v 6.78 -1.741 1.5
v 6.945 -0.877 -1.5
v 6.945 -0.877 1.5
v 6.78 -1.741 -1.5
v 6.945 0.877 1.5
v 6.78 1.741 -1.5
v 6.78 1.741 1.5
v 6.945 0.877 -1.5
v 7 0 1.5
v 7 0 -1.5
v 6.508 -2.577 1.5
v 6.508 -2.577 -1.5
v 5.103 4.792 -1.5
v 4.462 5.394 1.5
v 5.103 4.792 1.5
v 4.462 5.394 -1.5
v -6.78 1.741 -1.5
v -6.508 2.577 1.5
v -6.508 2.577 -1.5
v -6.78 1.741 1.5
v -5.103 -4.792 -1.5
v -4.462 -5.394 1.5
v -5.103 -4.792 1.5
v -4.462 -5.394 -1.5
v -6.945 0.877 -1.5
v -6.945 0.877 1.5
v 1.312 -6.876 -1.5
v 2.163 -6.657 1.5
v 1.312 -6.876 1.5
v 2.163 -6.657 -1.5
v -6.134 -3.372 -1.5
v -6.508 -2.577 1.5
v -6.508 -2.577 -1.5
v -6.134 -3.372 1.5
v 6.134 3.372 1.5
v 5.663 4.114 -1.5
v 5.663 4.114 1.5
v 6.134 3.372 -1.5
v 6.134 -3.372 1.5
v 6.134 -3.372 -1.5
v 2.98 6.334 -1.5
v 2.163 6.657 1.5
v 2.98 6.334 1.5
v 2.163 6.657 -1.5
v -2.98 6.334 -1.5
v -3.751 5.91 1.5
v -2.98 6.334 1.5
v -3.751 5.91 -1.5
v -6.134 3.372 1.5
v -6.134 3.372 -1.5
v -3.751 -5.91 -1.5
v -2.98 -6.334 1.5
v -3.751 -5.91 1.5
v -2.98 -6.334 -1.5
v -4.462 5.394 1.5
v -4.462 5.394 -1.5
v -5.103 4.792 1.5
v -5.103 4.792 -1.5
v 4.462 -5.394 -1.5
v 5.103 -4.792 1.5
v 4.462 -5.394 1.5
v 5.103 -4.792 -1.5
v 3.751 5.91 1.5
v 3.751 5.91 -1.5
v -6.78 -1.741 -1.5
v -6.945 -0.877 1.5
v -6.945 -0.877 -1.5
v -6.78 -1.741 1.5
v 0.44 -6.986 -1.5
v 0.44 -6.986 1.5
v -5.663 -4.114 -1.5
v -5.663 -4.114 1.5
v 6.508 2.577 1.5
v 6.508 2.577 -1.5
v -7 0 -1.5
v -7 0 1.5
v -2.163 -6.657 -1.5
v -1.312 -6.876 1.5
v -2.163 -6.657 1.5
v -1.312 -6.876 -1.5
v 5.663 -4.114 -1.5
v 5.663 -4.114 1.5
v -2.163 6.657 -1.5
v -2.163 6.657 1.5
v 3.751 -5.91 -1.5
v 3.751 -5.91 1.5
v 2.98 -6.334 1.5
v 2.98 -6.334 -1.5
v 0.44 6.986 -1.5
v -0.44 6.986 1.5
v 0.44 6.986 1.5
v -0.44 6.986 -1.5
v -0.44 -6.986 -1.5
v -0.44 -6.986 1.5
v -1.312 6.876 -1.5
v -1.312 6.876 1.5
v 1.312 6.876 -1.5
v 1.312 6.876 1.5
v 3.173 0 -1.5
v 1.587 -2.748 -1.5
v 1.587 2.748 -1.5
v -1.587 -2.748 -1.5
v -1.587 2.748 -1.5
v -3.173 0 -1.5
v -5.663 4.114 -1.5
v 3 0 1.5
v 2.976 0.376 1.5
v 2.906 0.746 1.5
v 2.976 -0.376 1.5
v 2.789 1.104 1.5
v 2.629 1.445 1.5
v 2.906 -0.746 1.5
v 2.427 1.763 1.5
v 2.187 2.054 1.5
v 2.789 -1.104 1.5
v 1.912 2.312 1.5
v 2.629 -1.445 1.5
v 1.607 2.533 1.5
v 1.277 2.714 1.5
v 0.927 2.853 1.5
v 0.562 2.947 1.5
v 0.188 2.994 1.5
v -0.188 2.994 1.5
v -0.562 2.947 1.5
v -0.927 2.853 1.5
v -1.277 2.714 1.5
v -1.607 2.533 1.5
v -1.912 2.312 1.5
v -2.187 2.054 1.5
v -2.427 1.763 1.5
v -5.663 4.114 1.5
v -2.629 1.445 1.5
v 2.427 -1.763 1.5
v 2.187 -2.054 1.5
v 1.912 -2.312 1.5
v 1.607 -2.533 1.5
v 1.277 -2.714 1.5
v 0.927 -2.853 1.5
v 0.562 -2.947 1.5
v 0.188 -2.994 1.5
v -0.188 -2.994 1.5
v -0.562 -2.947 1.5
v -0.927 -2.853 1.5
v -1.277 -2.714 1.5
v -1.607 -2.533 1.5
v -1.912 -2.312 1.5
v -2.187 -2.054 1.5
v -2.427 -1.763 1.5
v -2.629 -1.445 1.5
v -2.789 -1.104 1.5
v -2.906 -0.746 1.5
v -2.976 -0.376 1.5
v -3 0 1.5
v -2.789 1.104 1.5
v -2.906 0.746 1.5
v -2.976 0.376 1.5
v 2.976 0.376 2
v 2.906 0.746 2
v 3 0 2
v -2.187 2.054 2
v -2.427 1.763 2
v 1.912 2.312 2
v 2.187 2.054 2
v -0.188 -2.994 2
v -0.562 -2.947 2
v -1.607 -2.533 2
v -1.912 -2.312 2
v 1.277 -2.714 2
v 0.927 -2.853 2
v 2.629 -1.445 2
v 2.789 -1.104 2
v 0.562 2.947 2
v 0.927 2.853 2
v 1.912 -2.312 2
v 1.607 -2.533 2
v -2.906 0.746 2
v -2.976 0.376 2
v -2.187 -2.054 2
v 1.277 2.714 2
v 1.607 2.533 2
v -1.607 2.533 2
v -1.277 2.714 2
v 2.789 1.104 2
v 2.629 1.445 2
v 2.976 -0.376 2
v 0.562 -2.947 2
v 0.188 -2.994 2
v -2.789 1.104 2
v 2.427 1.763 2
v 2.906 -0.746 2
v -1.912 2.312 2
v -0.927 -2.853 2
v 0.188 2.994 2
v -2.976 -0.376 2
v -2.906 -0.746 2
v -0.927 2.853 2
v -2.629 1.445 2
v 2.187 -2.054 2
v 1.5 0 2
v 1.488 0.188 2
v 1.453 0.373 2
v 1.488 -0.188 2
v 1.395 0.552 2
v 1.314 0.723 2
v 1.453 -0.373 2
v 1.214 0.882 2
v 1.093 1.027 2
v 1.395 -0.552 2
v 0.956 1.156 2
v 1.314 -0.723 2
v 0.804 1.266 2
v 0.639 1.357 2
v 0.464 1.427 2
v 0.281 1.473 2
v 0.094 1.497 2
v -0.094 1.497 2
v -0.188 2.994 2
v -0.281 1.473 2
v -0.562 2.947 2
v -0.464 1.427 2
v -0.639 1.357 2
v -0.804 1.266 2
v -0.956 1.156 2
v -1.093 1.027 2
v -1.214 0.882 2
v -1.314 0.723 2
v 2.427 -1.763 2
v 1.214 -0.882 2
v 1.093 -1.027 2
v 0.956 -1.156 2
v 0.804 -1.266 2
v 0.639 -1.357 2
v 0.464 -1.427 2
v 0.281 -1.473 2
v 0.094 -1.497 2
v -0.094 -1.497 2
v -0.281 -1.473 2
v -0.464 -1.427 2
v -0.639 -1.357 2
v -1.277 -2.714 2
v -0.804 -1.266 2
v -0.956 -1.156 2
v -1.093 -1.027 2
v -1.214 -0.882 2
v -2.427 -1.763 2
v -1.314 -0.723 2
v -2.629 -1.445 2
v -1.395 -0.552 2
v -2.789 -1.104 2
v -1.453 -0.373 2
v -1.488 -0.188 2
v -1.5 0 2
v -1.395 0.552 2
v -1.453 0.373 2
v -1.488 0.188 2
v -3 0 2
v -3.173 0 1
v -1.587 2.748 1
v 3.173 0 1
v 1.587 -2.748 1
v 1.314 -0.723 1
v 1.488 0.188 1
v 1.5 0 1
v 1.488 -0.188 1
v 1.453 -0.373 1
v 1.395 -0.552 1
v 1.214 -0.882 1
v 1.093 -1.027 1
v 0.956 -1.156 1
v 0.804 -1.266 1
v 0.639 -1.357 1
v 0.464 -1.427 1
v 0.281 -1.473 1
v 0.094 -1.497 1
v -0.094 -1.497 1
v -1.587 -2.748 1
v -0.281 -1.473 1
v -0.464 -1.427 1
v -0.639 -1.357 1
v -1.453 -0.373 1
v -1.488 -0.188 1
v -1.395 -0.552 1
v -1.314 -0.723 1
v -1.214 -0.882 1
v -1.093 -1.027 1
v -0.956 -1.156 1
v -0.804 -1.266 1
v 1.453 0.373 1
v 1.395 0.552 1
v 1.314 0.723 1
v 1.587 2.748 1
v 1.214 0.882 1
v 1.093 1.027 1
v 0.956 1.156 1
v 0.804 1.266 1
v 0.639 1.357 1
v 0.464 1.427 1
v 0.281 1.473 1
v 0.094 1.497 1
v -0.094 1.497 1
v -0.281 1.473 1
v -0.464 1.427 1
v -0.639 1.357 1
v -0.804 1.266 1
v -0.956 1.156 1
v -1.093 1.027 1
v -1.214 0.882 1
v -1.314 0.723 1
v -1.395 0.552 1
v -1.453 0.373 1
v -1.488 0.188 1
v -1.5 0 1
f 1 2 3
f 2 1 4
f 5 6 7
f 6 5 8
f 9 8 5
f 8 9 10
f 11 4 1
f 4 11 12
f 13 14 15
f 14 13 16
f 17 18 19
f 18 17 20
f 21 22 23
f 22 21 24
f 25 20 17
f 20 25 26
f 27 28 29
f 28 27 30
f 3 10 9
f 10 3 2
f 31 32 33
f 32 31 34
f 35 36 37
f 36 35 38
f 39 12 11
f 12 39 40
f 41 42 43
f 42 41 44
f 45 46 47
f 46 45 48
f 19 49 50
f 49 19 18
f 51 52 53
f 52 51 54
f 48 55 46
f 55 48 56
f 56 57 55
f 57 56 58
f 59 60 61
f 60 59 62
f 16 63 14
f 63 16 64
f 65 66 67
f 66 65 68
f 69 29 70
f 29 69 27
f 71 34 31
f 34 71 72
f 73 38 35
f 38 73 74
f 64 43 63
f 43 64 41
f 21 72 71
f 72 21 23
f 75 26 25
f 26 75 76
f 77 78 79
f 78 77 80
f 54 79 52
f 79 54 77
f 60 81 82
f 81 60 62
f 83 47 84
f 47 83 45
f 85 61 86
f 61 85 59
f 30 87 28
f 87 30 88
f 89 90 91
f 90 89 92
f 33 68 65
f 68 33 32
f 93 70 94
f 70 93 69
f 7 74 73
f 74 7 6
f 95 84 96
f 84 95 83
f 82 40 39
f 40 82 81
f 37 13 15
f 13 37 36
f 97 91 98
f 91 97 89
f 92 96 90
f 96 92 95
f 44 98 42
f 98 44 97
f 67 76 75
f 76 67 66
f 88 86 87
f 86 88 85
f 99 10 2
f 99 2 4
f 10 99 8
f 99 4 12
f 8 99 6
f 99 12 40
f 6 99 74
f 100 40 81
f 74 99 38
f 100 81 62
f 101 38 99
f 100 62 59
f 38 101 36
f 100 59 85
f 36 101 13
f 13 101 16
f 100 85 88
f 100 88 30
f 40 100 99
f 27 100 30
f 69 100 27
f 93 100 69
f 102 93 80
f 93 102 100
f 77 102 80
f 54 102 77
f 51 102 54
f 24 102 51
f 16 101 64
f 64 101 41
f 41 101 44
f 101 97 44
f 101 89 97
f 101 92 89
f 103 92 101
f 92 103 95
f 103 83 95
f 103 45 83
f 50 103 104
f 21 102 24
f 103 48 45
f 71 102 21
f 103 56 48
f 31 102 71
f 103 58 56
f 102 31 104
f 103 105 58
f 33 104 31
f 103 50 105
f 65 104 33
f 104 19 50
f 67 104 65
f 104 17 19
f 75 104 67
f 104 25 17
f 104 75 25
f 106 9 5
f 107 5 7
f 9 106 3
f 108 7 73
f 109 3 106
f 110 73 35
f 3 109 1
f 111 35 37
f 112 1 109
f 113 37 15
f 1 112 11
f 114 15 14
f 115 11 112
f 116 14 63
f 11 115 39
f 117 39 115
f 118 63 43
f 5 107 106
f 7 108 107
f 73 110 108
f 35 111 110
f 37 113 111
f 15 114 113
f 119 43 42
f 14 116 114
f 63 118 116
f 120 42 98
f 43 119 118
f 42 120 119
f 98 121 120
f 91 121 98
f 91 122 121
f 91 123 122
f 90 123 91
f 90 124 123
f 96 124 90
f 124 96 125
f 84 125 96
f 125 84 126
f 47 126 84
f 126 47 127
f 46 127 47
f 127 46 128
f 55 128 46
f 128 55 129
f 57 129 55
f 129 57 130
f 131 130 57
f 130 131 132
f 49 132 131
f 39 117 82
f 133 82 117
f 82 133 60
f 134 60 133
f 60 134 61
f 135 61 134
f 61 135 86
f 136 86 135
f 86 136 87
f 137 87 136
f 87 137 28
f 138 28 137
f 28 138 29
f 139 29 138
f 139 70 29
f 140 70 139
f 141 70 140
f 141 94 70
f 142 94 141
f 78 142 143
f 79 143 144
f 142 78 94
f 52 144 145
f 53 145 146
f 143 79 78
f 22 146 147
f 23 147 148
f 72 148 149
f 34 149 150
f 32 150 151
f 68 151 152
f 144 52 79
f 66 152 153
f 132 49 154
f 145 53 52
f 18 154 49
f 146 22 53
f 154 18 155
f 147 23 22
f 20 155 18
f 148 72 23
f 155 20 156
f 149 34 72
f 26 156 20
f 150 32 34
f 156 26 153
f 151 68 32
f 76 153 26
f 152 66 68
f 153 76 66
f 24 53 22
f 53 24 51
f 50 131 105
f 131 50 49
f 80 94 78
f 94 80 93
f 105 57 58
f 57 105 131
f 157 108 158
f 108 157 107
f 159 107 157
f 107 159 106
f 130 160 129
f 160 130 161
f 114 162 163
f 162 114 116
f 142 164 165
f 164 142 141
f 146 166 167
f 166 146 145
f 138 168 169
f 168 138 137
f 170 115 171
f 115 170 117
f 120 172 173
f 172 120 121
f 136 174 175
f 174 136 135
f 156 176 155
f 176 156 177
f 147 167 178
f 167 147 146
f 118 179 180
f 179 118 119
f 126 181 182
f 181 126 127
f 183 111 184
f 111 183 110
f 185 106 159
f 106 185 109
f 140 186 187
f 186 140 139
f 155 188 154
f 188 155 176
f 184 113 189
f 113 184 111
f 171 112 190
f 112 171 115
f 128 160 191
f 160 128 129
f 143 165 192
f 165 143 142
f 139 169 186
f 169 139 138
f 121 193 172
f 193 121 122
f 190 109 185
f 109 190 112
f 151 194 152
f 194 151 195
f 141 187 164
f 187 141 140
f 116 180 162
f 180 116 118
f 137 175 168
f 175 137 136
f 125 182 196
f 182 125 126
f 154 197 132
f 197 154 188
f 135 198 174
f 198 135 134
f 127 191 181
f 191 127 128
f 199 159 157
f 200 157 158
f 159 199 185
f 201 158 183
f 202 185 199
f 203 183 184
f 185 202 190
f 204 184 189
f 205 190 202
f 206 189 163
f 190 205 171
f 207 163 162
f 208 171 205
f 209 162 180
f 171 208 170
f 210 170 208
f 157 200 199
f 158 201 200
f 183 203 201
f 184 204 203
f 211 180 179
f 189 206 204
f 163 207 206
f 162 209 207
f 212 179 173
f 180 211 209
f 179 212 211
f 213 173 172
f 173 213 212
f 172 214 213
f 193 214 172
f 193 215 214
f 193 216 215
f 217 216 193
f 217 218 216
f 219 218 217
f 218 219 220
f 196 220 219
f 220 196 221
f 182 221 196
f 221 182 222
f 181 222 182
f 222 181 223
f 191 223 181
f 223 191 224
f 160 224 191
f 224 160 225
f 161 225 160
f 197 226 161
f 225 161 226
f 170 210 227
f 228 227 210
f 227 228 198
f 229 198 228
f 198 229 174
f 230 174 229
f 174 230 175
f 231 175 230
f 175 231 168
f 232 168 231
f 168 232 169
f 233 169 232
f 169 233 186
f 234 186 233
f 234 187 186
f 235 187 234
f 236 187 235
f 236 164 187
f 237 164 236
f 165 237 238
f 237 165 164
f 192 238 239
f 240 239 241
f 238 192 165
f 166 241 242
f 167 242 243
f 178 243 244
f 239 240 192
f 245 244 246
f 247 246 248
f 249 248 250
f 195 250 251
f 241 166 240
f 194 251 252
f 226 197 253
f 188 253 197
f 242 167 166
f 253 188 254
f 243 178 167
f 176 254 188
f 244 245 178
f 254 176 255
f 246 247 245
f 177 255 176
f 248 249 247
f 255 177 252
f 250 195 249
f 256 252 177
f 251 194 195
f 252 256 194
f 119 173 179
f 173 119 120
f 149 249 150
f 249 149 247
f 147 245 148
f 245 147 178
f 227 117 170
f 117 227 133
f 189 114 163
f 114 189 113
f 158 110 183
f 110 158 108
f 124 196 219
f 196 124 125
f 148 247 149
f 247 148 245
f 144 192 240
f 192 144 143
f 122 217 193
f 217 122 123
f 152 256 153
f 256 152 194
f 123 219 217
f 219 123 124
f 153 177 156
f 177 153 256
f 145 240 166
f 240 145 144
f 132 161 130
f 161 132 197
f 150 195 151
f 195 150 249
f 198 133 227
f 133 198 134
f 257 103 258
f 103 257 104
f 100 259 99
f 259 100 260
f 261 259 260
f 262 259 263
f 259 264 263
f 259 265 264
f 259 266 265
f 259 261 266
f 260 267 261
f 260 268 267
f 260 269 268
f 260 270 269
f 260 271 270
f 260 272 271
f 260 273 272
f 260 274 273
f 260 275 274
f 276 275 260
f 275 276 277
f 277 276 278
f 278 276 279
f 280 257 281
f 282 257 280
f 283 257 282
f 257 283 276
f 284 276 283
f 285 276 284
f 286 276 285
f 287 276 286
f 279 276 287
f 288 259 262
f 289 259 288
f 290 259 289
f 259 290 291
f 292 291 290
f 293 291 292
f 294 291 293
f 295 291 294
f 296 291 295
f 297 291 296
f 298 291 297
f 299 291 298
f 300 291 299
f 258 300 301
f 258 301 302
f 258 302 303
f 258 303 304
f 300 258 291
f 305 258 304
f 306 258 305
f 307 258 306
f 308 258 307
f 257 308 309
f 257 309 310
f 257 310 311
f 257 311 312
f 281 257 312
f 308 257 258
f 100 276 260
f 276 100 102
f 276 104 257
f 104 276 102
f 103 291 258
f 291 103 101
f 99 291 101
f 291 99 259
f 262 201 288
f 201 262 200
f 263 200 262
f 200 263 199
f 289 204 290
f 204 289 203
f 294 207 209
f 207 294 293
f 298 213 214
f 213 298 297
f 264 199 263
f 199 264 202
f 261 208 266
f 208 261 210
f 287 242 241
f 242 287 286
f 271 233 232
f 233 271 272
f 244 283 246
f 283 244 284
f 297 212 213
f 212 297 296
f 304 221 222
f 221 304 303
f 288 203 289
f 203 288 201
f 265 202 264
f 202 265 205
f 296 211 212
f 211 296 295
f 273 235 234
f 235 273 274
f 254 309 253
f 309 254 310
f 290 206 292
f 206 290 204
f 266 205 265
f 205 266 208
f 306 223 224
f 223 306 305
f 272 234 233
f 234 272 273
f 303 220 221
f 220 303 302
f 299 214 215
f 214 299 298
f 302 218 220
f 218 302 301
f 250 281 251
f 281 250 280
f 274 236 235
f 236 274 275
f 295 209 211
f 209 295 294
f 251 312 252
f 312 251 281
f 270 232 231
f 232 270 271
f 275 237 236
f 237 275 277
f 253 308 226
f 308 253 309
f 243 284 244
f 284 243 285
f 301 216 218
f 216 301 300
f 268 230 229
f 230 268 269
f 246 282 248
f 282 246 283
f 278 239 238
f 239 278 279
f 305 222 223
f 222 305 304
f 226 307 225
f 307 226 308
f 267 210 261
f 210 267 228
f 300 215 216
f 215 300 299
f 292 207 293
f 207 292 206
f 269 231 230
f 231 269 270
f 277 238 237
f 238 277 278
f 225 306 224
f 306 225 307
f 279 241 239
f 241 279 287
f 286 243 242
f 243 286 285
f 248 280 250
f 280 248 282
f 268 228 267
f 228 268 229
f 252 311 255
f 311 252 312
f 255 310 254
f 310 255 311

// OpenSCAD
$fn = 50;


difference() {
	union() {
		translate(v = [0, 0, -1.5000000000]) {
			cylinder(h = 3, r = 7.0000000000);
		}
		translate(v = [0, 0, -1.5000000000]) {
			cylinder(h = 3.5000000000, r = 3.0000000000);
		}
	}
	union() {
		translate(v = [0, 0, -1.5000000000]) {
			rotate(a = [0, 0, 0]) {
				difference() {
					union() {
						#linear_extrude(height = 2.5000000000) {
							polygon(points = [[3.1735000000, 0.0000000000], [1.5867500000, 2.7483316189], [-1.5867500000, 2.7483316189], [-3.1735000000, 0.0000000000], [-1.5867500000, -2.7483316189], [1.5867500000, -2.7483316189]]);
						}
					}
					union();
				}
			}
		}
		translate(v = [0, 0, -50.0000000000]) {
			cylinder(h = 100, r = 1.5000000000);
		}
	}
}
